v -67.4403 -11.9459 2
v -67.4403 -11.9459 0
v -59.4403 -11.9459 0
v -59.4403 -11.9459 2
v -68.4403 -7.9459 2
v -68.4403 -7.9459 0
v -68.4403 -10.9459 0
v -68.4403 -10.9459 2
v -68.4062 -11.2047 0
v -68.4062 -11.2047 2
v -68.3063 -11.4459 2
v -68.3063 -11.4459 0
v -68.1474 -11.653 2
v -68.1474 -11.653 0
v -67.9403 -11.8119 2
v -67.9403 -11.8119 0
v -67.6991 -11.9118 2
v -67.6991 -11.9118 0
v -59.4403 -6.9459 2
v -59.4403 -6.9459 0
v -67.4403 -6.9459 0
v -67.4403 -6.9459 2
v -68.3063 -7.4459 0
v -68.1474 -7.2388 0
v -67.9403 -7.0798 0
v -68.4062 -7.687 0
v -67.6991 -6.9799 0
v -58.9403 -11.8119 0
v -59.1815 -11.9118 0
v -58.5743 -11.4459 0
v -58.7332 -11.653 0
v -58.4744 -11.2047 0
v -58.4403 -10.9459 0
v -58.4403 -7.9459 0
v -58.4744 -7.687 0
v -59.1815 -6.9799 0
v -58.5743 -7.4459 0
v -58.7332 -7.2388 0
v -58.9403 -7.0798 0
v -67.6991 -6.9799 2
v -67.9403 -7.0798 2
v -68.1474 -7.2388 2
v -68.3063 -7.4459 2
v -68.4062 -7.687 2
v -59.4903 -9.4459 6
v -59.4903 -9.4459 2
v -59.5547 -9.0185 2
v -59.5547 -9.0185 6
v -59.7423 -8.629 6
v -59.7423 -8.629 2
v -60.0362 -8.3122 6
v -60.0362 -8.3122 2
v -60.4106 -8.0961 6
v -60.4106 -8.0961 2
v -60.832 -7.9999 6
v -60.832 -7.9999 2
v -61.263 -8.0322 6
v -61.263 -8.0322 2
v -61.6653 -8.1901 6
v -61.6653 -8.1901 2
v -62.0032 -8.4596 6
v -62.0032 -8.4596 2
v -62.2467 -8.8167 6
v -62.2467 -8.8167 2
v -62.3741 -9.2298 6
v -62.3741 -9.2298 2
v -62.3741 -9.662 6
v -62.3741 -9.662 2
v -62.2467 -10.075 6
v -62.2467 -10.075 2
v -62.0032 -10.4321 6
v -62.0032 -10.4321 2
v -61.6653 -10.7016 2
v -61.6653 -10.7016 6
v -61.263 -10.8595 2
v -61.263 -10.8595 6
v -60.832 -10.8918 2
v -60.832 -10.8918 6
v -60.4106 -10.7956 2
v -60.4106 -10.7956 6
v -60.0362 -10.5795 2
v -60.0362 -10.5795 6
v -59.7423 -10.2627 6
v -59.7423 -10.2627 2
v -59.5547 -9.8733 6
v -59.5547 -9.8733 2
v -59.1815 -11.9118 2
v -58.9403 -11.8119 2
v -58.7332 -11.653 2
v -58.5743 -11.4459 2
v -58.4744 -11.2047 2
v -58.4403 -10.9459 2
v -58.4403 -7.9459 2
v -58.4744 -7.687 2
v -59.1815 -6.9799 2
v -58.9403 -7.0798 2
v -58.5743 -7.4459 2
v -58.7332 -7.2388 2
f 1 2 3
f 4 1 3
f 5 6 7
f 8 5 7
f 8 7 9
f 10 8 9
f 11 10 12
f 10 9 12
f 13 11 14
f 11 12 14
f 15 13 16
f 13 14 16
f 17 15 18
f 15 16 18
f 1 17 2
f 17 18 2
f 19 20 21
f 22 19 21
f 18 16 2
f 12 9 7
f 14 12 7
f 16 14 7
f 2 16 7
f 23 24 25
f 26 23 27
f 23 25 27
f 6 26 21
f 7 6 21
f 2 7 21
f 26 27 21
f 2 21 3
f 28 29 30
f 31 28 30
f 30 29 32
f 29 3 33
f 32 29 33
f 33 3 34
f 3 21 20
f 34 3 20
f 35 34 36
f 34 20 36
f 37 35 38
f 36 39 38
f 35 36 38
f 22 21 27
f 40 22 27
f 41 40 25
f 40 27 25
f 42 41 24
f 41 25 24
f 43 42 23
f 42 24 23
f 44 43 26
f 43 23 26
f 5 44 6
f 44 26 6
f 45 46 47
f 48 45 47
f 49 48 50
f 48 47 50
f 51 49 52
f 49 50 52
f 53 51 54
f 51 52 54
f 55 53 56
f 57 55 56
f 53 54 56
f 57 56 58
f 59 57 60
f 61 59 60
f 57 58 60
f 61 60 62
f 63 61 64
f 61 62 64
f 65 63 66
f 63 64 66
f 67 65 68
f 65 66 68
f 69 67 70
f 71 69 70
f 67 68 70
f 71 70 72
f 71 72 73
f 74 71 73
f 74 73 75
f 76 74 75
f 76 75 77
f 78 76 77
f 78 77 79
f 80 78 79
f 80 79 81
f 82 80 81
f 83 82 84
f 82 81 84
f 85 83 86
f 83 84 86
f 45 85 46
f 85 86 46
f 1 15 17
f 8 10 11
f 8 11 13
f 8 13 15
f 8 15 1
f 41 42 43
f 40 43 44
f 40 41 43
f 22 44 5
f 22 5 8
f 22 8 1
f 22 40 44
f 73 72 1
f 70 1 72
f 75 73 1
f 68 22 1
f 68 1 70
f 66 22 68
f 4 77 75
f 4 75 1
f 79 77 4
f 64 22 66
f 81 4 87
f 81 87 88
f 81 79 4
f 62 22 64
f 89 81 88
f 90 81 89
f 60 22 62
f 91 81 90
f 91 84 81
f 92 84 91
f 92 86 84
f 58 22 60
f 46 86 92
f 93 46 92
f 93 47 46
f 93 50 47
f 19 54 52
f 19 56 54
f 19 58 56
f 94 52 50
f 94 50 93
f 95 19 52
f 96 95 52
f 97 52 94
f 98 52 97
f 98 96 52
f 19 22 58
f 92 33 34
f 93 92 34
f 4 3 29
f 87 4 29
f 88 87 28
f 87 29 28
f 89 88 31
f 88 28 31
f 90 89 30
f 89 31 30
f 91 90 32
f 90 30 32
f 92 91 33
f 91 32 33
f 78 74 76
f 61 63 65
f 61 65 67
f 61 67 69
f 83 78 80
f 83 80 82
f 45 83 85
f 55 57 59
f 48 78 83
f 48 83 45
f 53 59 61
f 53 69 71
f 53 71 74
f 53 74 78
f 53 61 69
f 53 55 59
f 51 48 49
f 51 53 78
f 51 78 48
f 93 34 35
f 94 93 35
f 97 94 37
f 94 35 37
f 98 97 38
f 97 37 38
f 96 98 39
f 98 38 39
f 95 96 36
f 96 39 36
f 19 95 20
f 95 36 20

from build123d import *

# Parameters (mm, degrees)
F1_DEPTH = 2
F2_R     = 1.45
F3_DEPTH = 4


with BuildPart() as f1:
    # F0 (on Top) → F1 (new body)
    with BuildSketch(Plane.XY):
        with BuildLine():
            Line((-67.440309, -11.945863), (-59.440309, -11.945863))
            ThreePointArc((-59.440309, -11.945863), (-58.733202, -11.65297), (-58.440309, -10.945863))
            Line((-58.440309, -10.945863), (-58.440309, -7.945863))
            ThreePointArc((-58.440309, -7.945863), (-58.733202, -7.238756), (-59.440309, -6.945863))
            Line((-59.440309, -6.945863), (-67.440309, -6.945863))
            ThreePointArc((-67.440309, -6.945863), (-68.147416, -7.238756), (-68.440309, -7.945863))
            Line((-68.440309, -7.945863), (-68.440309, -10.945863))
            ThreePointArc((-68.440309, -10.945863), (-68.147416, -11.65297), (-67.440309, -11.945863))
        make_face()
    extrude(amount=F1_DEPTH)

    # F2 (on face) → F3 (join)
    with BuildSketch(Plane.XY.offset(2)):
        with Locations((-60.940309, -9.445863)):
            Circle(F2_R)
    extrude(amount=F3_DEPTH)


solid = f1.part
